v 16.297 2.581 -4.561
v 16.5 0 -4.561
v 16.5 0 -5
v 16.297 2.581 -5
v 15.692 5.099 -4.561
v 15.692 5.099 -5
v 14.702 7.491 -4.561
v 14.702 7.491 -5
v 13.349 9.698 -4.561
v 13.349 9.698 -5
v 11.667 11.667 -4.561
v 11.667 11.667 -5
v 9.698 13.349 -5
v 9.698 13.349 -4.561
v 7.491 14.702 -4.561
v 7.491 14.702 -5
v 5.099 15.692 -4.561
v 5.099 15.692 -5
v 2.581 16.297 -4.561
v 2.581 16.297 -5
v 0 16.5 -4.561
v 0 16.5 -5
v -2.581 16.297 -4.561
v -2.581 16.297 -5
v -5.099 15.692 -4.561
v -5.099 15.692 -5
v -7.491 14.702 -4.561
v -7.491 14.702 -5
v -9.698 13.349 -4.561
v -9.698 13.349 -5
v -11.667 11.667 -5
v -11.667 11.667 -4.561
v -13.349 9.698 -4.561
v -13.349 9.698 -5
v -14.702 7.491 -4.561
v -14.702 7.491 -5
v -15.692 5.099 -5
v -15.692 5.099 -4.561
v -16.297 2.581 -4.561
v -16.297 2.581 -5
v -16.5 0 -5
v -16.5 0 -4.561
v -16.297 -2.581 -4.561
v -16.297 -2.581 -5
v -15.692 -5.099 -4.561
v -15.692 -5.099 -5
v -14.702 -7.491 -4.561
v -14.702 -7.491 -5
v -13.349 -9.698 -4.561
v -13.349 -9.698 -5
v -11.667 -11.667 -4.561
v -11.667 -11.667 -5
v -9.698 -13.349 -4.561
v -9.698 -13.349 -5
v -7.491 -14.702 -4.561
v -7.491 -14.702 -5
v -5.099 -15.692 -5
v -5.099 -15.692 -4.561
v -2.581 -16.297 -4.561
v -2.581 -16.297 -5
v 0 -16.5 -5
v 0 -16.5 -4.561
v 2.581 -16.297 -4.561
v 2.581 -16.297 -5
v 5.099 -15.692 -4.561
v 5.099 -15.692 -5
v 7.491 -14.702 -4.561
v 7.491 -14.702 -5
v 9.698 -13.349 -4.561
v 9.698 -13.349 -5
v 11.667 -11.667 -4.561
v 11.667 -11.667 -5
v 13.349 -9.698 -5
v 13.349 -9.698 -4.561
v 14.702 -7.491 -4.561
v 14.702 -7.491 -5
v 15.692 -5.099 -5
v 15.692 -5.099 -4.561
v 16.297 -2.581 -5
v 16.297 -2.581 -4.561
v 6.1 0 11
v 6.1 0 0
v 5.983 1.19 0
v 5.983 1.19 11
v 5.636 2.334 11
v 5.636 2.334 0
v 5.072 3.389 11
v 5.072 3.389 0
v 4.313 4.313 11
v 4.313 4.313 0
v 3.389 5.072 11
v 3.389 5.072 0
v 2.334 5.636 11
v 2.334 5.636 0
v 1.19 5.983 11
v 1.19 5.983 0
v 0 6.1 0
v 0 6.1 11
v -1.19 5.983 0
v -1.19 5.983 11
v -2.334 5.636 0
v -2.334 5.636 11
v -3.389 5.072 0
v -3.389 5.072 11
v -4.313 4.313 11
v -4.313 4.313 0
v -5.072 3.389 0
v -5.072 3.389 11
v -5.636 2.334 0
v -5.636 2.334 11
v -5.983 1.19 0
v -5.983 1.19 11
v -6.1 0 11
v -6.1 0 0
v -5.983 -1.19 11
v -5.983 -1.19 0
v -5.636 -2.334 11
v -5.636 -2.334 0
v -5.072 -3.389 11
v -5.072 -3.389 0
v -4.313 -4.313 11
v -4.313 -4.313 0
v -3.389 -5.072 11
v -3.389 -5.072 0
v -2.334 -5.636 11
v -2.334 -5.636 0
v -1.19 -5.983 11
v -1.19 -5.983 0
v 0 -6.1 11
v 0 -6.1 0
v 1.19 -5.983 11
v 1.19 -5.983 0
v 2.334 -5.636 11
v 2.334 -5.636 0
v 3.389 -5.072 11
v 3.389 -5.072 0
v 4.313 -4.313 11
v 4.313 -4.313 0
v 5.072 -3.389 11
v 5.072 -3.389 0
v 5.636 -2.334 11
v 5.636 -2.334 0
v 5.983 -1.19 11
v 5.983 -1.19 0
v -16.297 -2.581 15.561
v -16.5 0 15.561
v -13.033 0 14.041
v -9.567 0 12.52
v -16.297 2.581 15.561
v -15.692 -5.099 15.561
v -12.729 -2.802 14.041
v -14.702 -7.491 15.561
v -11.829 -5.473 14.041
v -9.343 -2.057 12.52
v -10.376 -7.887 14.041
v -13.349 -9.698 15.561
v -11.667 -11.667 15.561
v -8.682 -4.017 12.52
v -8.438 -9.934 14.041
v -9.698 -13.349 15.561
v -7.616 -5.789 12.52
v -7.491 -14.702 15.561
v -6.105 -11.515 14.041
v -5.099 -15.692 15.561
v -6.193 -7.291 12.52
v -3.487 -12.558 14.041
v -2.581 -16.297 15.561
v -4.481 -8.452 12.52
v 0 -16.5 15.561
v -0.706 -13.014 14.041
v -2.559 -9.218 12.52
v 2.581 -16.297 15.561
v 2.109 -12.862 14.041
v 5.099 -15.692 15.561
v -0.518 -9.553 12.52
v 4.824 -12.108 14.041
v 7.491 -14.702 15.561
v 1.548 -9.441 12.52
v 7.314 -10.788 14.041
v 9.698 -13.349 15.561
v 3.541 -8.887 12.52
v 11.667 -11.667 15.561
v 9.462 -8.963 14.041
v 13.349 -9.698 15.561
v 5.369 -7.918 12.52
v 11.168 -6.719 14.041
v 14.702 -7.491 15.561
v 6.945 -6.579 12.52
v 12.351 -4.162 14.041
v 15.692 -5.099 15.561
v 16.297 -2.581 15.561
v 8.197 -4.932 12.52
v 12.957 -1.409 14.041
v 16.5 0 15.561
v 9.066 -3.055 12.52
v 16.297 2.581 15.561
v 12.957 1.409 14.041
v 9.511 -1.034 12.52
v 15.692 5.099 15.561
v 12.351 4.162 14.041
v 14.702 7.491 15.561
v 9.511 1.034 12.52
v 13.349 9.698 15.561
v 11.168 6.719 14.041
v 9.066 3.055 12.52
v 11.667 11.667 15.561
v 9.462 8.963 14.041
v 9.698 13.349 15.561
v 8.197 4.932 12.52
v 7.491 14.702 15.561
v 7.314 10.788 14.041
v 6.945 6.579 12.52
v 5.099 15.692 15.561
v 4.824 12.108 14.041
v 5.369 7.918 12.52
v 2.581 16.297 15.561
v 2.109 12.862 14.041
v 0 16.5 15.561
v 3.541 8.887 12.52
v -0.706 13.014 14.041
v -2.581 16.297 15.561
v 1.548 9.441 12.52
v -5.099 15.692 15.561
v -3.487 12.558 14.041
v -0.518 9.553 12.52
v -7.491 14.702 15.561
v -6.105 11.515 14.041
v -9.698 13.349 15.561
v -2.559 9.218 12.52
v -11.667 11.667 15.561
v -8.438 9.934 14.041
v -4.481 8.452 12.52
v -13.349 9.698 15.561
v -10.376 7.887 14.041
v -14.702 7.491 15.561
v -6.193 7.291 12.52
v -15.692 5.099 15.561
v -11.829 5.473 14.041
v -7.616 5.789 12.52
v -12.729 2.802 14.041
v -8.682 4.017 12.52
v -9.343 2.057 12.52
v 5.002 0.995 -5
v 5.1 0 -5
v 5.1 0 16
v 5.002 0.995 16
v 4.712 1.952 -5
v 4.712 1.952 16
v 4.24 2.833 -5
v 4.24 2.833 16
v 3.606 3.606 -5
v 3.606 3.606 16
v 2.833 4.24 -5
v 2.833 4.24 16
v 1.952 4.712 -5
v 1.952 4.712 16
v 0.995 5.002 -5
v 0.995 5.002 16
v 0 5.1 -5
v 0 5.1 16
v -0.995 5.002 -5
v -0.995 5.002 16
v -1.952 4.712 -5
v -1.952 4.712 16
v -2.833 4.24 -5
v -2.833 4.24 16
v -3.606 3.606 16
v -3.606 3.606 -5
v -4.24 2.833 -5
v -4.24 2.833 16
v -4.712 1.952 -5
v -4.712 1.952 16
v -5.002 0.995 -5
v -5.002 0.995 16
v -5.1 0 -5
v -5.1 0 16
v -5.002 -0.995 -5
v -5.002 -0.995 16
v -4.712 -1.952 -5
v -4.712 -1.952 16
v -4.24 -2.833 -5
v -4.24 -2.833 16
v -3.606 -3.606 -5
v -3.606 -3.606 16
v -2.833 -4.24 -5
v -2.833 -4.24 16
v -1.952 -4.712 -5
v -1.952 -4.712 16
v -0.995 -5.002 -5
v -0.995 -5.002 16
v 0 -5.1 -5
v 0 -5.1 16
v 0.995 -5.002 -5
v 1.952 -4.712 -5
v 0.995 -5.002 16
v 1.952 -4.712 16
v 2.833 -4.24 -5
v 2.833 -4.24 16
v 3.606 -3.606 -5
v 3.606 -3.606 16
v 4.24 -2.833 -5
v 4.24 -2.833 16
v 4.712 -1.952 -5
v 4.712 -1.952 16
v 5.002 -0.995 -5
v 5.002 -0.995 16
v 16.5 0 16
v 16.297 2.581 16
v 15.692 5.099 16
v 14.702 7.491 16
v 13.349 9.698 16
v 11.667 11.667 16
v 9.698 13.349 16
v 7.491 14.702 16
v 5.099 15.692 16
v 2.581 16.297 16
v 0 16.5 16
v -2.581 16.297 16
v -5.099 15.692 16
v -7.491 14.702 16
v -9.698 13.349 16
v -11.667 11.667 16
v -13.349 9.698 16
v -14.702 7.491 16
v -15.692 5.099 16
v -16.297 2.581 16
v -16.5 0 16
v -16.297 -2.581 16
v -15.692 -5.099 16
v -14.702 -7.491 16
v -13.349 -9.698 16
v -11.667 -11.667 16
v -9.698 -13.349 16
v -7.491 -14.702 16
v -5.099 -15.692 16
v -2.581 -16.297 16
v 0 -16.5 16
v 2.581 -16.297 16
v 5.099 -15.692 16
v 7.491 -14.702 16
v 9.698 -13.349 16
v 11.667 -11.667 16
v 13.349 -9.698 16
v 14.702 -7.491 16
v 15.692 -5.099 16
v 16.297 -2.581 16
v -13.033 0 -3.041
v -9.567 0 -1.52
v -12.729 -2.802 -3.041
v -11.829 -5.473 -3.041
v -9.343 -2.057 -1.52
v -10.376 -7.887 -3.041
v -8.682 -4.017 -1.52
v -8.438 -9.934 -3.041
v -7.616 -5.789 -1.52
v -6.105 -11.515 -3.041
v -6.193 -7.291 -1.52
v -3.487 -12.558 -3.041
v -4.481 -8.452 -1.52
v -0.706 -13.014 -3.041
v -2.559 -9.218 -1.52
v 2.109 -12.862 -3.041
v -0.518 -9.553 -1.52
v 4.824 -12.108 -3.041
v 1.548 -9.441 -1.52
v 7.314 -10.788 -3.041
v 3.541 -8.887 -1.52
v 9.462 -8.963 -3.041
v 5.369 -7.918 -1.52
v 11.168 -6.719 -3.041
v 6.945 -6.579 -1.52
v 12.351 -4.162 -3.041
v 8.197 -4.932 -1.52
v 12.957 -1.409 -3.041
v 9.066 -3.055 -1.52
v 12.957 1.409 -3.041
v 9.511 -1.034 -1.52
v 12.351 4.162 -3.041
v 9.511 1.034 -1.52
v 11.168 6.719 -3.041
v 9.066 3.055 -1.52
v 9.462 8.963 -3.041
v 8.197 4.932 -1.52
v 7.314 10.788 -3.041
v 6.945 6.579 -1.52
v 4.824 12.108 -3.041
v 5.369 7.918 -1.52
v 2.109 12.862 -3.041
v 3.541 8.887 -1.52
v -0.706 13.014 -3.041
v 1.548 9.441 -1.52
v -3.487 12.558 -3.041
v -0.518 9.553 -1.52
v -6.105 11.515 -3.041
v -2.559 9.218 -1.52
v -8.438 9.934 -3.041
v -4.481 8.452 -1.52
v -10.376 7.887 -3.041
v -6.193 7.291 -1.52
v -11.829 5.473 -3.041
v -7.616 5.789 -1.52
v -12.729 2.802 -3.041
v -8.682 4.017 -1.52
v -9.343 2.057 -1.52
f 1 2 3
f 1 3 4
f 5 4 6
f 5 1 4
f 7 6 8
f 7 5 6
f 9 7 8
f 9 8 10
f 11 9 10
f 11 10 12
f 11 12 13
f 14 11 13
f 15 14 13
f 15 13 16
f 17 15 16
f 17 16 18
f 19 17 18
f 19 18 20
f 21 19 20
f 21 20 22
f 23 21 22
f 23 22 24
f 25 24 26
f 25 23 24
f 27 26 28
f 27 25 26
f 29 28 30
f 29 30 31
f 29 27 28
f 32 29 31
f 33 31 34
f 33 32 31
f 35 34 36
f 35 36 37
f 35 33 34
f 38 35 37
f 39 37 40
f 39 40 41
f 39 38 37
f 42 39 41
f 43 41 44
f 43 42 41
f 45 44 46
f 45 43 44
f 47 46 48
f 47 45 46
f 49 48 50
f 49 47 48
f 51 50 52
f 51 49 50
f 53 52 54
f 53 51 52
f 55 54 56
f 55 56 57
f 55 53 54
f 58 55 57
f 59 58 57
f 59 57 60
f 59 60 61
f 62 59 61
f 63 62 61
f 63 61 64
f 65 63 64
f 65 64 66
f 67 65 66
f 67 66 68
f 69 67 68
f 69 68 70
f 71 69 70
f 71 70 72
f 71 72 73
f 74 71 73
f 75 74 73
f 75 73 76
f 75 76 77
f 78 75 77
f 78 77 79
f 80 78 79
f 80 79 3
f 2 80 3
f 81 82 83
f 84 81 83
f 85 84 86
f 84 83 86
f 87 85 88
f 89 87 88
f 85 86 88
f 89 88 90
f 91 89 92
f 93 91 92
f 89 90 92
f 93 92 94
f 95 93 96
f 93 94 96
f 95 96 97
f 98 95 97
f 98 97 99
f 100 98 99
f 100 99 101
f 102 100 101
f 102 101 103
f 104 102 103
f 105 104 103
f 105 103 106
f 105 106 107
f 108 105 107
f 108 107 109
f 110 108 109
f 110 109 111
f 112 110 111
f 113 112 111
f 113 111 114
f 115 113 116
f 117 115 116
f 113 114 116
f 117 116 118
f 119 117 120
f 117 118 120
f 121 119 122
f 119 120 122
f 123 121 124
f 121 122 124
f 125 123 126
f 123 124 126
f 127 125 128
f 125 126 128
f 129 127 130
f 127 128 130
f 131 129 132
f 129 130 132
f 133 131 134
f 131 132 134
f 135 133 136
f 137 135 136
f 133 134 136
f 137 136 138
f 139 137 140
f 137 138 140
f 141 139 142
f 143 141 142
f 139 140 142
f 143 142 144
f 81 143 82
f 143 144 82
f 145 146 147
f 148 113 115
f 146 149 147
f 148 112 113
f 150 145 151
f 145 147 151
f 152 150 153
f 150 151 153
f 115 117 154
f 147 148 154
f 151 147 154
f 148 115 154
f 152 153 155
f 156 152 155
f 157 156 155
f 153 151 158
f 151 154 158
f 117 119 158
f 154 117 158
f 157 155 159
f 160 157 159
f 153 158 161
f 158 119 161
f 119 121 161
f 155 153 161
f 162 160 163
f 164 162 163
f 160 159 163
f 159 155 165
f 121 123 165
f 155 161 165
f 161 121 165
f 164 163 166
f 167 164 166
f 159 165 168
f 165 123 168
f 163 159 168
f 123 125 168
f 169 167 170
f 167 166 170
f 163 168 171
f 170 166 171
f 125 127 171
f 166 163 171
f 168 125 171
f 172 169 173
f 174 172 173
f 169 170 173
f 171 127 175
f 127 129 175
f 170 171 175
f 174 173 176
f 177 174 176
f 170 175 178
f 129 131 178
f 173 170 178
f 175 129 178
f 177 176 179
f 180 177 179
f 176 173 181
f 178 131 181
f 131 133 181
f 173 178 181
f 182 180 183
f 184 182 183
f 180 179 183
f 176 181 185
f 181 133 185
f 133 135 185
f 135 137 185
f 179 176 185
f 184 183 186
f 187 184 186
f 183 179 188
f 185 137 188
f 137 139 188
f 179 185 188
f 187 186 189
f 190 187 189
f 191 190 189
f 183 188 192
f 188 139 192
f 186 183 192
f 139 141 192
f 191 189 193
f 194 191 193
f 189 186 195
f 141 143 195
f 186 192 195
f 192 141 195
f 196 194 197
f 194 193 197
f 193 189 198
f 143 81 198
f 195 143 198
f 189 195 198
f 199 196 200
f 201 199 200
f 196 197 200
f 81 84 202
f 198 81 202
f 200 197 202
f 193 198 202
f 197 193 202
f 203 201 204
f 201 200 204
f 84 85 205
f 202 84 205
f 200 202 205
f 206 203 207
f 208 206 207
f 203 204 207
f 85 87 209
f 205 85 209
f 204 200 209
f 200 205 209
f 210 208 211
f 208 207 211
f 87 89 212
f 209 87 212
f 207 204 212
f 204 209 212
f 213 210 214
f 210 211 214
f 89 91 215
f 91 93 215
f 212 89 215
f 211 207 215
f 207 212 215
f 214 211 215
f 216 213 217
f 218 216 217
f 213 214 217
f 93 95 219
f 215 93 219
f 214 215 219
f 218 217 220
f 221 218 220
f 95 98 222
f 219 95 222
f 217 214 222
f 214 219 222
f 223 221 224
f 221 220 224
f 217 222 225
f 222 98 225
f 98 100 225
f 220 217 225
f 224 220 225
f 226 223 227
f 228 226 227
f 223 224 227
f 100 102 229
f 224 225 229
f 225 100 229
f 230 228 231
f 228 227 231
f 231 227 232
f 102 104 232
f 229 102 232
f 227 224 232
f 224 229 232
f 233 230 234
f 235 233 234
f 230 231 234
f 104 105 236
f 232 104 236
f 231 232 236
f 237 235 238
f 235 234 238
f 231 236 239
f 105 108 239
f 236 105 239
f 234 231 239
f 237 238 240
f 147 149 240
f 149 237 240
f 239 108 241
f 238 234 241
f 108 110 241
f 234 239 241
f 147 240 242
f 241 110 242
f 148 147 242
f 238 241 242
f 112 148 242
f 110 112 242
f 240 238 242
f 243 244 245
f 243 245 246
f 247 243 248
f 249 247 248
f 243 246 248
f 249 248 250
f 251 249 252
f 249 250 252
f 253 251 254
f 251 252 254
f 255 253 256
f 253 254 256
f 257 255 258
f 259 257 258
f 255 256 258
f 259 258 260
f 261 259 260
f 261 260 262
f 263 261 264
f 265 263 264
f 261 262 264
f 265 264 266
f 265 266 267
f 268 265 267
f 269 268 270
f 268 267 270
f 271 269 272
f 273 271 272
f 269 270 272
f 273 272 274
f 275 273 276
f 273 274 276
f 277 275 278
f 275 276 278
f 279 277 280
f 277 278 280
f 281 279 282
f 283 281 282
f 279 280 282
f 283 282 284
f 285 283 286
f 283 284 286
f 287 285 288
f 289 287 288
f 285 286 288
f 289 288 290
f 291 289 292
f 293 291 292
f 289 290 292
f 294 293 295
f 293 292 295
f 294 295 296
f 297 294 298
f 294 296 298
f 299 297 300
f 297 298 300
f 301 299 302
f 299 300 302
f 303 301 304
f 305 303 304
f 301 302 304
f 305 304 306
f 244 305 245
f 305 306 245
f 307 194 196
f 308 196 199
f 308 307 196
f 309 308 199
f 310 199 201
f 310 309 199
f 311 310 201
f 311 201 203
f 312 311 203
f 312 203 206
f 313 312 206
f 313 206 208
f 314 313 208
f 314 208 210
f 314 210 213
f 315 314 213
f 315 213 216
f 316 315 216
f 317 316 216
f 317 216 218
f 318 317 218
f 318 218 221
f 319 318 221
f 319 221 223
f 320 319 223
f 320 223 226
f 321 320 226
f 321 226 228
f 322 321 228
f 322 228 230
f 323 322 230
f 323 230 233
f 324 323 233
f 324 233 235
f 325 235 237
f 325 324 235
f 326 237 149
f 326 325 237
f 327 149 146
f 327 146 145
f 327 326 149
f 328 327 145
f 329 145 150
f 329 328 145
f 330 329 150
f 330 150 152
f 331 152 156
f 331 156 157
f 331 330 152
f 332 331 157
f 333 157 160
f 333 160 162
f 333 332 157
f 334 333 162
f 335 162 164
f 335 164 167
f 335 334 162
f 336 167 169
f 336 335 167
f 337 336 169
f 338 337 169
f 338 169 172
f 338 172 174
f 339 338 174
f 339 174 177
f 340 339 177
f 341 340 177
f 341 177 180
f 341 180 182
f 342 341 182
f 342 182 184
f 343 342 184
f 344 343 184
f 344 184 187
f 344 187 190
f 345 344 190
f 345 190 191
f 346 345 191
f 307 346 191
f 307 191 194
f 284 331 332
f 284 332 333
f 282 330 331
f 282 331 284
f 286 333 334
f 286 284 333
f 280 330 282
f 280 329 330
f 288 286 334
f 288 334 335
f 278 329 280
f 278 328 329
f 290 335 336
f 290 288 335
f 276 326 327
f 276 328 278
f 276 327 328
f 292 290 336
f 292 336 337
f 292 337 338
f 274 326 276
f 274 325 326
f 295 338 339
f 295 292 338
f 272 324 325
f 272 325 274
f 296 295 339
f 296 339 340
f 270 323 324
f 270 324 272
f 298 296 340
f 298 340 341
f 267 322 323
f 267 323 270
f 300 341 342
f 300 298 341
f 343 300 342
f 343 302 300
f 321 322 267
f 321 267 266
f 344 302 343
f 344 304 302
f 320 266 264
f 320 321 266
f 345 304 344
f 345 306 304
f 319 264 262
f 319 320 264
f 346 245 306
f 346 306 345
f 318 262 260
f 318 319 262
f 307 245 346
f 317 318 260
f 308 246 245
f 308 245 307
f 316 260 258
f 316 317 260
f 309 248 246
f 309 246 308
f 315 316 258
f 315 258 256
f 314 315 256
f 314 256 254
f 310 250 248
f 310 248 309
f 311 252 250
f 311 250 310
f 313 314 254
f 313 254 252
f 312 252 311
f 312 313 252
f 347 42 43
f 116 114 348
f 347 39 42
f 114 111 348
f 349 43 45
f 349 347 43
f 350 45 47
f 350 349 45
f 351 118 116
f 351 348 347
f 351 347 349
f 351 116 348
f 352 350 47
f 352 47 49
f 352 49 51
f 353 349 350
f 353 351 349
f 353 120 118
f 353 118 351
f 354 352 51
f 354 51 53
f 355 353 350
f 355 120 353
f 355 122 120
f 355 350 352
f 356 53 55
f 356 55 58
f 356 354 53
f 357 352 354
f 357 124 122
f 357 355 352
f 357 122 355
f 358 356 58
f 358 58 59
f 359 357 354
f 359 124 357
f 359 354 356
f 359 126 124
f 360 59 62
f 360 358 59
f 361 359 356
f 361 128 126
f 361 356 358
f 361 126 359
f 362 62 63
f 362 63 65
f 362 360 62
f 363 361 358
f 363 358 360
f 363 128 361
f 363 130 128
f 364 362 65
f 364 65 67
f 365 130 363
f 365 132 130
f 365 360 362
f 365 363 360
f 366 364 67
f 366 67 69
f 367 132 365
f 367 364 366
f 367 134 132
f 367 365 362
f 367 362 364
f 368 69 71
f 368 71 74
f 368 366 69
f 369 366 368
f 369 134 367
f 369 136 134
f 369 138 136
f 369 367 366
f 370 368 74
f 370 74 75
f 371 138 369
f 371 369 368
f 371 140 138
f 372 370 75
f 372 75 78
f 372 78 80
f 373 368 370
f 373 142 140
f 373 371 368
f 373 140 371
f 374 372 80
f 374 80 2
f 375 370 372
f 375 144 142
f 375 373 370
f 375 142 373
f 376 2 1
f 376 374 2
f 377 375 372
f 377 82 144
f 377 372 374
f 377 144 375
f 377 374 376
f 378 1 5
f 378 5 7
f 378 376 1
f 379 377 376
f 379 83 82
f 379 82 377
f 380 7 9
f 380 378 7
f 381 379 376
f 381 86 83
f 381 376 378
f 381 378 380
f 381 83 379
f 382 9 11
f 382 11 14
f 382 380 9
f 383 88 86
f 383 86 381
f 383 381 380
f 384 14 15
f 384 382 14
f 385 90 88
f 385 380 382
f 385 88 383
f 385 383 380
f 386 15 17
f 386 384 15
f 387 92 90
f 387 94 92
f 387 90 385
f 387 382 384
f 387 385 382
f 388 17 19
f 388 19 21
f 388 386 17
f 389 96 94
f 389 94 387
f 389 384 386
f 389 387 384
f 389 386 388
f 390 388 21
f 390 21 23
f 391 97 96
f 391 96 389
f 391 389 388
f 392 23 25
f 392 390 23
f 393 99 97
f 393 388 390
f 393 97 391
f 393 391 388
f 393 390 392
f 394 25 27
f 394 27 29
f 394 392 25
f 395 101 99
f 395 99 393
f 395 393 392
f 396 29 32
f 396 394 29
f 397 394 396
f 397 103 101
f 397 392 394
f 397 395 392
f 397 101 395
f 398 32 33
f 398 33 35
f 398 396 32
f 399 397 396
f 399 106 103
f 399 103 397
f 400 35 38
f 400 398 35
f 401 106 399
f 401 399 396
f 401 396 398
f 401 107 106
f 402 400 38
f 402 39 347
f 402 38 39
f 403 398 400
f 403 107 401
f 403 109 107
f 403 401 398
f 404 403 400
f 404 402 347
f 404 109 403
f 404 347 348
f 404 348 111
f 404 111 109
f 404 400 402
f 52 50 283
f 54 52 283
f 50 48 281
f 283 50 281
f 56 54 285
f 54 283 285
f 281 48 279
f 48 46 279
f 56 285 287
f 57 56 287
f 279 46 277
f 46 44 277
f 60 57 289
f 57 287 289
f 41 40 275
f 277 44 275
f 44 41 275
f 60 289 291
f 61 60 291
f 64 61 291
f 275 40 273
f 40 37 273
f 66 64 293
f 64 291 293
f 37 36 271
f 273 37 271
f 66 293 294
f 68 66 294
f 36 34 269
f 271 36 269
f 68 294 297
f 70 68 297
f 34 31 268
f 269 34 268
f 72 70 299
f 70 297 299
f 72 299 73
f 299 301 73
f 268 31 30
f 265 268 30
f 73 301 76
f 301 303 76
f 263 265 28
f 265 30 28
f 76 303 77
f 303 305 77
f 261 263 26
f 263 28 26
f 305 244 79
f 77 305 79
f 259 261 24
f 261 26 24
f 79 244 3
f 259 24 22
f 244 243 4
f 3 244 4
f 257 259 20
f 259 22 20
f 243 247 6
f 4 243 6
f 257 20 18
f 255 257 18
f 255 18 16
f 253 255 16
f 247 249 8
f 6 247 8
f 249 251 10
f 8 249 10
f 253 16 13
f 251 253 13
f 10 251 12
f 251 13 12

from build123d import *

# Parameters (mm, degrees)
SKETCH_1_R          = 6.1
SKETCH_1_R_2        = 5.1
EXTRUDE_1_DEPTH     = 11
SKETCH_2_R          = 17.5
SKETCH_2_R_2        = 5.1
EXTRUDE_2_DEPTH     = 5
SKETCH_4_OUTSIDE_W  = 47.754
SKETCH_4_OUTSIDE_H  = 47.754
SKETCH_4_OUTSIDE_R  = 16.5
CUT_EXTRUDE_1_DEPTH = 33.457664734


with BuildPart() as part:
    # 스케치1 → 보스-돌출1 (new body)
    with BuildSketch(Plane.XY):
        Circle(SKETCH_1_R)
        Circle(SKETCH_1_R_2, mode=Mode.SUBTRACT)
    extrude(amount=EXTRUDE_1_DEPTH)

    # 스케치2 → 보스-돌출2 (add)
    with BuildSketch(Plane.XY.offset(11)):
        Circle(SKETCH_2_R)
        Circle(SKETCH_2_R_2, mode=Mode.SUBTRACT)
    extrude_2 = extrude(amount=EXTRUDE_2_DEPTH)

    # 대칭 복사1: 보스-돌출2 across plane
    add(extrude_2.mirror(Plane.XY.offset(5.5)))

    # 스케치3 → 컷-회전1 (revolve, cut)
    with BuildSketch(Plane(origin=(0, 0, 0), x_dir=(1, 0, 0), z_dir=(0, 1, 0))):
        Polygon((-17.5, 5), (-6.1, 0), (-17.5, 0), align=None)
        Polygon((-17.5, -11), (-17.5, -16), (-6.1, -11), align=None)
    revolve(axis=Axis((0, 0, -9.433987915), (0, 0, 1)), mode=Mode.SUBTRACT)

    # 스케치4 outside → 컷-돌출1 (cut, through all)
    with BuildSketch(Plane.XY.offset(16)):
        Rectangle(SKETCH_4_OUTSIDE_W, SKETCH_4_OUTSIDE_H)
        Circle(SKETCH_4_OUTSIDE_R, mode=Mode.SUBTRACT)
    extrude(amount=-CUT_EXTRUDE_1_DEPTH, mode=Mode.SUBTRACT)


solid = part.part
